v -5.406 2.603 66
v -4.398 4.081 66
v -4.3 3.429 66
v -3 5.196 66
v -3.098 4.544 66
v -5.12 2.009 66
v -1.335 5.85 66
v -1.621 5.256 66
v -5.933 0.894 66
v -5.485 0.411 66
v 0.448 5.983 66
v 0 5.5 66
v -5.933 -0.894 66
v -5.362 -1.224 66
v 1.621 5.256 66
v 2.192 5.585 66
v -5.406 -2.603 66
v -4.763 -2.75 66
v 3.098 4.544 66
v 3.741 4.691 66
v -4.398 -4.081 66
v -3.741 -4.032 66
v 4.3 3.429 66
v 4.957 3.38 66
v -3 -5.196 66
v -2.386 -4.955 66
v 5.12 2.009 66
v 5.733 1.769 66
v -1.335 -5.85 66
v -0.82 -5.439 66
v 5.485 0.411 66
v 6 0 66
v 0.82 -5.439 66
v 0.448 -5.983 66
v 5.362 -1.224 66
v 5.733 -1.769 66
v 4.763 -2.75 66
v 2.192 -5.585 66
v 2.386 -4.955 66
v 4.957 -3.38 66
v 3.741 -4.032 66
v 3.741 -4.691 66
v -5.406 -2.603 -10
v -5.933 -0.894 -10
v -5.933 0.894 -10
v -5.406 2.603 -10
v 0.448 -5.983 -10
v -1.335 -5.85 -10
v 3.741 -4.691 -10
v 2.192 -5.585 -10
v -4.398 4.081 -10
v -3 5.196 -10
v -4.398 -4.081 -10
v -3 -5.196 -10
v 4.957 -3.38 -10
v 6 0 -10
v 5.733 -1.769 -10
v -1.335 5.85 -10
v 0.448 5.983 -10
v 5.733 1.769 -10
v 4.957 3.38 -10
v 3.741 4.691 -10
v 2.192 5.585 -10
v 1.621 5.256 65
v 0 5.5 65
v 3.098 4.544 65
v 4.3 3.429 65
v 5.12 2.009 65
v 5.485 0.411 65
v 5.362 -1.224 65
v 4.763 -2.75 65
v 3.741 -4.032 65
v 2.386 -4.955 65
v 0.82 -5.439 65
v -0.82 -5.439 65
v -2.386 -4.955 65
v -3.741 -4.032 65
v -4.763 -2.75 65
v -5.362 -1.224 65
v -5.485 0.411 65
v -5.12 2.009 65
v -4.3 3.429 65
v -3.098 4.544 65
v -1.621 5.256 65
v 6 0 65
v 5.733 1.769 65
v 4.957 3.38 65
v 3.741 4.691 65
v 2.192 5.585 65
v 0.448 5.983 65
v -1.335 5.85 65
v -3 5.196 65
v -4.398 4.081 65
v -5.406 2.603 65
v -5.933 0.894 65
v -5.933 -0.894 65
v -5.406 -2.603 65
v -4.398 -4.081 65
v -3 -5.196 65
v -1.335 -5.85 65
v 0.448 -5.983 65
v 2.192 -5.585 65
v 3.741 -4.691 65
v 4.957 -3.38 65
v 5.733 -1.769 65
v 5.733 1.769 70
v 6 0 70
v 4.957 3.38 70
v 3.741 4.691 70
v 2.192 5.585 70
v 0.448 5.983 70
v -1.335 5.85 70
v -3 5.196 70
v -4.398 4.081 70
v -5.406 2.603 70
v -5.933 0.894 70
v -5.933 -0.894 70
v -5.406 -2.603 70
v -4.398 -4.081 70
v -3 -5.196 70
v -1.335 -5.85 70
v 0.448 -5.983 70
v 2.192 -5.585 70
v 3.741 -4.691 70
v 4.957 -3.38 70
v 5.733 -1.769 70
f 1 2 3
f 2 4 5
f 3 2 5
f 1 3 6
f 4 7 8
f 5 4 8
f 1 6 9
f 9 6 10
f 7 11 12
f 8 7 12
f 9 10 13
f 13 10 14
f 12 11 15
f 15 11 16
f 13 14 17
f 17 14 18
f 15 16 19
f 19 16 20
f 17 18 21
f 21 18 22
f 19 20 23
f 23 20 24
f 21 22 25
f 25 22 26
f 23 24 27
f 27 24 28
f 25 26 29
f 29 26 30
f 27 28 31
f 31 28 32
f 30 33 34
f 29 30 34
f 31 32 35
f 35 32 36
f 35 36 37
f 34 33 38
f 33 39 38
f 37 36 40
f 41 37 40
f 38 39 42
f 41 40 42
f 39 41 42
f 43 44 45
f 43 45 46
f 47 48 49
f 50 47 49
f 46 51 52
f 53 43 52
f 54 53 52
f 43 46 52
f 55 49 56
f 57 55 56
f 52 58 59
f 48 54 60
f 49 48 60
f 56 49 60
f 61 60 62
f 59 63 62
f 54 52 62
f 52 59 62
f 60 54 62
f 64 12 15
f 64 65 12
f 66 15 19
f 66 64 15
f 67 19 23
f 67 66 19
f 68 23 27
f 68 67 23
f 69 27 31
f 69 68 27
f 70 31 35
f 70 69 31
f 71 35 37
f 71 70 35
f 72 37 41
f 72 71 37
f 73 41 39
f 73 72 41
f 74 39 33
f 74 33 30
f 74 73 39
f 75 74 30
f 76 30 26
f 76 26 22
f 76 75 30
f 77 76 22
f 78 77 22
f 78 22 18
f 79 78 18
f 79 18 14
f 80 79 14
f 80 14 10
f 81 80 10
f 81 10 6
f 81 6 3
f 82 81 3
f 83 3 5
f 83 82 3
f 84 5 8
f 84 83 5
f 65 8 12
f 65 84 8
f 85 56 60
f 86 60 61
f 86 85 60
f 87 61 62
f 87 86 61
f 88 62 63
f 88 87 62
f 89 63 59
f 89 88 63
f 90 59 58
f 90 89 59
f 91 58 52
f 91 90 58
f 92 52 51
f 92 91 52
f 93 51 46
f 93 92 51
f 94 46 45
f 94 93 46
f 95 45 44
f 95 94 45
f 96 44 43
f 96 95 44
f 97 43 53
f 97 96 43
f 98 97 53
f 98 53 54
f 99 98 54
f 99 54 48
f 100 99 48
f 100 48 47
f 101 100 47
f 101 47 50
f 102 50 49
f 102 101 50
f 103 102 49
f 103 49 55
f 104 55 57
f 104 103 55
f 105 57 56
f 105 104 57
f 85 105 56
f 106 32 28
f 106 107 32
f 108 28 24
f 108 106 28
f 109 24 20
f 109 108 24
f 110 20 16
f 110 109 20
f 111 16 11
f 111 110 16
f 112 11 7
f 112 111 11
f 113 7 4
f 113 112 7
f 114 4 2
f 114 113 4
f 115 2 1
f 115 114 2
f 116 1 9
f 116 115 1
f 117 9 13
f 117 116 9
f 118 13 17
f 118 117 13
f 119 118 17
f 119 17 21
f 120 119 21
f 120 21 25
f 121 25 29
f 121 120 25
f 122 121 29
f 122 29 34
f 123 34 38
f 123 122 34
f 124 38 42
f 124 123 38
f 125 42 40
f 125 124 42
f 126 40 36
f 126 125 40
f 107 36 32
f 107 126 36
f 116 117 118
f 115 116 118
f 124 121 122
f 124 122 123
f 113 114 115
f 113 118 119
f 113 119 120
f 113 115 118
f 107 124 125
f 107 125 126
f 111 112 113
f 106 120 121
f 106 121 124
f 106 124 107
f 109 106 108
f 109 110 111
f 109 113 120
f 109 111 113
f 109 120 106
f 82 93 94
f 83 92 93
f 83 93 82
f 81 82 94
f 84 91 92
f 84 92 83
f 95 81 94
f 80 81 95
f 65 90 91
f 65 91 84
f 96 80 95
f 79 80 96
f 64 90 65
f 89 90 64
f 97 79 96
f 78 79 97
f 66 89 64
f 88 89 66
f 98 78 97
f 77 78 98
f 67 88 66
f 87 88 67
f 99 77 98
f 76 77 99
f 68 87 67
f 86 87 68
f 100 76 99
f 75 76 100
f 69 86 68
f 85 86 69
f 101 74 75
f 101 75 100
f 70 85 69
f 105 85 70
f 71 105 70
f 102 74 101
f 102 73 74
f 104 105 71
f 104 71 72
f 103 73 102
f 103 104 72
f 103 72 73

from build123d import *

# Parameters (mm, degrees)
SKETCH_1_R           = 6
EXTRUDE_1_DEPTH      = 70
EXTRUDE_1_DEPTH_BACK = 10
SKETCH_3_W           = 1
SKETCH_3_H           = 0.5


with BuildPart() as part:
    # 草图1 → 凸台-拉伸1 (new body, two sides)
    with BuildSketch(Plane.XY) as extrude_1_sk:
        Circle(SKETCH_1_R)
    extrude(amount=EXTRUDE_1_DEPTH)
    extrude(extrude_1_sk.sketch, amount=-EXTRUDE_1_DEPTH_BACK)

    # 草图3 → 切除-旋转1 (revolve, cut)
    with BuildSketch(Plane(origin=(0, 0, 0), x_dir=(0, 0, -1), z_dir=(1, 0, 0))):
        with Locations((-65.5, 5.75)):
            Rectangle(SKETCH_3_W, SKETCH_3_H)
    revolve(axis=Axis((0, 0, 70), (0, 0, -1)), mode=Mode.SUBTRACT)


solid = part.part
